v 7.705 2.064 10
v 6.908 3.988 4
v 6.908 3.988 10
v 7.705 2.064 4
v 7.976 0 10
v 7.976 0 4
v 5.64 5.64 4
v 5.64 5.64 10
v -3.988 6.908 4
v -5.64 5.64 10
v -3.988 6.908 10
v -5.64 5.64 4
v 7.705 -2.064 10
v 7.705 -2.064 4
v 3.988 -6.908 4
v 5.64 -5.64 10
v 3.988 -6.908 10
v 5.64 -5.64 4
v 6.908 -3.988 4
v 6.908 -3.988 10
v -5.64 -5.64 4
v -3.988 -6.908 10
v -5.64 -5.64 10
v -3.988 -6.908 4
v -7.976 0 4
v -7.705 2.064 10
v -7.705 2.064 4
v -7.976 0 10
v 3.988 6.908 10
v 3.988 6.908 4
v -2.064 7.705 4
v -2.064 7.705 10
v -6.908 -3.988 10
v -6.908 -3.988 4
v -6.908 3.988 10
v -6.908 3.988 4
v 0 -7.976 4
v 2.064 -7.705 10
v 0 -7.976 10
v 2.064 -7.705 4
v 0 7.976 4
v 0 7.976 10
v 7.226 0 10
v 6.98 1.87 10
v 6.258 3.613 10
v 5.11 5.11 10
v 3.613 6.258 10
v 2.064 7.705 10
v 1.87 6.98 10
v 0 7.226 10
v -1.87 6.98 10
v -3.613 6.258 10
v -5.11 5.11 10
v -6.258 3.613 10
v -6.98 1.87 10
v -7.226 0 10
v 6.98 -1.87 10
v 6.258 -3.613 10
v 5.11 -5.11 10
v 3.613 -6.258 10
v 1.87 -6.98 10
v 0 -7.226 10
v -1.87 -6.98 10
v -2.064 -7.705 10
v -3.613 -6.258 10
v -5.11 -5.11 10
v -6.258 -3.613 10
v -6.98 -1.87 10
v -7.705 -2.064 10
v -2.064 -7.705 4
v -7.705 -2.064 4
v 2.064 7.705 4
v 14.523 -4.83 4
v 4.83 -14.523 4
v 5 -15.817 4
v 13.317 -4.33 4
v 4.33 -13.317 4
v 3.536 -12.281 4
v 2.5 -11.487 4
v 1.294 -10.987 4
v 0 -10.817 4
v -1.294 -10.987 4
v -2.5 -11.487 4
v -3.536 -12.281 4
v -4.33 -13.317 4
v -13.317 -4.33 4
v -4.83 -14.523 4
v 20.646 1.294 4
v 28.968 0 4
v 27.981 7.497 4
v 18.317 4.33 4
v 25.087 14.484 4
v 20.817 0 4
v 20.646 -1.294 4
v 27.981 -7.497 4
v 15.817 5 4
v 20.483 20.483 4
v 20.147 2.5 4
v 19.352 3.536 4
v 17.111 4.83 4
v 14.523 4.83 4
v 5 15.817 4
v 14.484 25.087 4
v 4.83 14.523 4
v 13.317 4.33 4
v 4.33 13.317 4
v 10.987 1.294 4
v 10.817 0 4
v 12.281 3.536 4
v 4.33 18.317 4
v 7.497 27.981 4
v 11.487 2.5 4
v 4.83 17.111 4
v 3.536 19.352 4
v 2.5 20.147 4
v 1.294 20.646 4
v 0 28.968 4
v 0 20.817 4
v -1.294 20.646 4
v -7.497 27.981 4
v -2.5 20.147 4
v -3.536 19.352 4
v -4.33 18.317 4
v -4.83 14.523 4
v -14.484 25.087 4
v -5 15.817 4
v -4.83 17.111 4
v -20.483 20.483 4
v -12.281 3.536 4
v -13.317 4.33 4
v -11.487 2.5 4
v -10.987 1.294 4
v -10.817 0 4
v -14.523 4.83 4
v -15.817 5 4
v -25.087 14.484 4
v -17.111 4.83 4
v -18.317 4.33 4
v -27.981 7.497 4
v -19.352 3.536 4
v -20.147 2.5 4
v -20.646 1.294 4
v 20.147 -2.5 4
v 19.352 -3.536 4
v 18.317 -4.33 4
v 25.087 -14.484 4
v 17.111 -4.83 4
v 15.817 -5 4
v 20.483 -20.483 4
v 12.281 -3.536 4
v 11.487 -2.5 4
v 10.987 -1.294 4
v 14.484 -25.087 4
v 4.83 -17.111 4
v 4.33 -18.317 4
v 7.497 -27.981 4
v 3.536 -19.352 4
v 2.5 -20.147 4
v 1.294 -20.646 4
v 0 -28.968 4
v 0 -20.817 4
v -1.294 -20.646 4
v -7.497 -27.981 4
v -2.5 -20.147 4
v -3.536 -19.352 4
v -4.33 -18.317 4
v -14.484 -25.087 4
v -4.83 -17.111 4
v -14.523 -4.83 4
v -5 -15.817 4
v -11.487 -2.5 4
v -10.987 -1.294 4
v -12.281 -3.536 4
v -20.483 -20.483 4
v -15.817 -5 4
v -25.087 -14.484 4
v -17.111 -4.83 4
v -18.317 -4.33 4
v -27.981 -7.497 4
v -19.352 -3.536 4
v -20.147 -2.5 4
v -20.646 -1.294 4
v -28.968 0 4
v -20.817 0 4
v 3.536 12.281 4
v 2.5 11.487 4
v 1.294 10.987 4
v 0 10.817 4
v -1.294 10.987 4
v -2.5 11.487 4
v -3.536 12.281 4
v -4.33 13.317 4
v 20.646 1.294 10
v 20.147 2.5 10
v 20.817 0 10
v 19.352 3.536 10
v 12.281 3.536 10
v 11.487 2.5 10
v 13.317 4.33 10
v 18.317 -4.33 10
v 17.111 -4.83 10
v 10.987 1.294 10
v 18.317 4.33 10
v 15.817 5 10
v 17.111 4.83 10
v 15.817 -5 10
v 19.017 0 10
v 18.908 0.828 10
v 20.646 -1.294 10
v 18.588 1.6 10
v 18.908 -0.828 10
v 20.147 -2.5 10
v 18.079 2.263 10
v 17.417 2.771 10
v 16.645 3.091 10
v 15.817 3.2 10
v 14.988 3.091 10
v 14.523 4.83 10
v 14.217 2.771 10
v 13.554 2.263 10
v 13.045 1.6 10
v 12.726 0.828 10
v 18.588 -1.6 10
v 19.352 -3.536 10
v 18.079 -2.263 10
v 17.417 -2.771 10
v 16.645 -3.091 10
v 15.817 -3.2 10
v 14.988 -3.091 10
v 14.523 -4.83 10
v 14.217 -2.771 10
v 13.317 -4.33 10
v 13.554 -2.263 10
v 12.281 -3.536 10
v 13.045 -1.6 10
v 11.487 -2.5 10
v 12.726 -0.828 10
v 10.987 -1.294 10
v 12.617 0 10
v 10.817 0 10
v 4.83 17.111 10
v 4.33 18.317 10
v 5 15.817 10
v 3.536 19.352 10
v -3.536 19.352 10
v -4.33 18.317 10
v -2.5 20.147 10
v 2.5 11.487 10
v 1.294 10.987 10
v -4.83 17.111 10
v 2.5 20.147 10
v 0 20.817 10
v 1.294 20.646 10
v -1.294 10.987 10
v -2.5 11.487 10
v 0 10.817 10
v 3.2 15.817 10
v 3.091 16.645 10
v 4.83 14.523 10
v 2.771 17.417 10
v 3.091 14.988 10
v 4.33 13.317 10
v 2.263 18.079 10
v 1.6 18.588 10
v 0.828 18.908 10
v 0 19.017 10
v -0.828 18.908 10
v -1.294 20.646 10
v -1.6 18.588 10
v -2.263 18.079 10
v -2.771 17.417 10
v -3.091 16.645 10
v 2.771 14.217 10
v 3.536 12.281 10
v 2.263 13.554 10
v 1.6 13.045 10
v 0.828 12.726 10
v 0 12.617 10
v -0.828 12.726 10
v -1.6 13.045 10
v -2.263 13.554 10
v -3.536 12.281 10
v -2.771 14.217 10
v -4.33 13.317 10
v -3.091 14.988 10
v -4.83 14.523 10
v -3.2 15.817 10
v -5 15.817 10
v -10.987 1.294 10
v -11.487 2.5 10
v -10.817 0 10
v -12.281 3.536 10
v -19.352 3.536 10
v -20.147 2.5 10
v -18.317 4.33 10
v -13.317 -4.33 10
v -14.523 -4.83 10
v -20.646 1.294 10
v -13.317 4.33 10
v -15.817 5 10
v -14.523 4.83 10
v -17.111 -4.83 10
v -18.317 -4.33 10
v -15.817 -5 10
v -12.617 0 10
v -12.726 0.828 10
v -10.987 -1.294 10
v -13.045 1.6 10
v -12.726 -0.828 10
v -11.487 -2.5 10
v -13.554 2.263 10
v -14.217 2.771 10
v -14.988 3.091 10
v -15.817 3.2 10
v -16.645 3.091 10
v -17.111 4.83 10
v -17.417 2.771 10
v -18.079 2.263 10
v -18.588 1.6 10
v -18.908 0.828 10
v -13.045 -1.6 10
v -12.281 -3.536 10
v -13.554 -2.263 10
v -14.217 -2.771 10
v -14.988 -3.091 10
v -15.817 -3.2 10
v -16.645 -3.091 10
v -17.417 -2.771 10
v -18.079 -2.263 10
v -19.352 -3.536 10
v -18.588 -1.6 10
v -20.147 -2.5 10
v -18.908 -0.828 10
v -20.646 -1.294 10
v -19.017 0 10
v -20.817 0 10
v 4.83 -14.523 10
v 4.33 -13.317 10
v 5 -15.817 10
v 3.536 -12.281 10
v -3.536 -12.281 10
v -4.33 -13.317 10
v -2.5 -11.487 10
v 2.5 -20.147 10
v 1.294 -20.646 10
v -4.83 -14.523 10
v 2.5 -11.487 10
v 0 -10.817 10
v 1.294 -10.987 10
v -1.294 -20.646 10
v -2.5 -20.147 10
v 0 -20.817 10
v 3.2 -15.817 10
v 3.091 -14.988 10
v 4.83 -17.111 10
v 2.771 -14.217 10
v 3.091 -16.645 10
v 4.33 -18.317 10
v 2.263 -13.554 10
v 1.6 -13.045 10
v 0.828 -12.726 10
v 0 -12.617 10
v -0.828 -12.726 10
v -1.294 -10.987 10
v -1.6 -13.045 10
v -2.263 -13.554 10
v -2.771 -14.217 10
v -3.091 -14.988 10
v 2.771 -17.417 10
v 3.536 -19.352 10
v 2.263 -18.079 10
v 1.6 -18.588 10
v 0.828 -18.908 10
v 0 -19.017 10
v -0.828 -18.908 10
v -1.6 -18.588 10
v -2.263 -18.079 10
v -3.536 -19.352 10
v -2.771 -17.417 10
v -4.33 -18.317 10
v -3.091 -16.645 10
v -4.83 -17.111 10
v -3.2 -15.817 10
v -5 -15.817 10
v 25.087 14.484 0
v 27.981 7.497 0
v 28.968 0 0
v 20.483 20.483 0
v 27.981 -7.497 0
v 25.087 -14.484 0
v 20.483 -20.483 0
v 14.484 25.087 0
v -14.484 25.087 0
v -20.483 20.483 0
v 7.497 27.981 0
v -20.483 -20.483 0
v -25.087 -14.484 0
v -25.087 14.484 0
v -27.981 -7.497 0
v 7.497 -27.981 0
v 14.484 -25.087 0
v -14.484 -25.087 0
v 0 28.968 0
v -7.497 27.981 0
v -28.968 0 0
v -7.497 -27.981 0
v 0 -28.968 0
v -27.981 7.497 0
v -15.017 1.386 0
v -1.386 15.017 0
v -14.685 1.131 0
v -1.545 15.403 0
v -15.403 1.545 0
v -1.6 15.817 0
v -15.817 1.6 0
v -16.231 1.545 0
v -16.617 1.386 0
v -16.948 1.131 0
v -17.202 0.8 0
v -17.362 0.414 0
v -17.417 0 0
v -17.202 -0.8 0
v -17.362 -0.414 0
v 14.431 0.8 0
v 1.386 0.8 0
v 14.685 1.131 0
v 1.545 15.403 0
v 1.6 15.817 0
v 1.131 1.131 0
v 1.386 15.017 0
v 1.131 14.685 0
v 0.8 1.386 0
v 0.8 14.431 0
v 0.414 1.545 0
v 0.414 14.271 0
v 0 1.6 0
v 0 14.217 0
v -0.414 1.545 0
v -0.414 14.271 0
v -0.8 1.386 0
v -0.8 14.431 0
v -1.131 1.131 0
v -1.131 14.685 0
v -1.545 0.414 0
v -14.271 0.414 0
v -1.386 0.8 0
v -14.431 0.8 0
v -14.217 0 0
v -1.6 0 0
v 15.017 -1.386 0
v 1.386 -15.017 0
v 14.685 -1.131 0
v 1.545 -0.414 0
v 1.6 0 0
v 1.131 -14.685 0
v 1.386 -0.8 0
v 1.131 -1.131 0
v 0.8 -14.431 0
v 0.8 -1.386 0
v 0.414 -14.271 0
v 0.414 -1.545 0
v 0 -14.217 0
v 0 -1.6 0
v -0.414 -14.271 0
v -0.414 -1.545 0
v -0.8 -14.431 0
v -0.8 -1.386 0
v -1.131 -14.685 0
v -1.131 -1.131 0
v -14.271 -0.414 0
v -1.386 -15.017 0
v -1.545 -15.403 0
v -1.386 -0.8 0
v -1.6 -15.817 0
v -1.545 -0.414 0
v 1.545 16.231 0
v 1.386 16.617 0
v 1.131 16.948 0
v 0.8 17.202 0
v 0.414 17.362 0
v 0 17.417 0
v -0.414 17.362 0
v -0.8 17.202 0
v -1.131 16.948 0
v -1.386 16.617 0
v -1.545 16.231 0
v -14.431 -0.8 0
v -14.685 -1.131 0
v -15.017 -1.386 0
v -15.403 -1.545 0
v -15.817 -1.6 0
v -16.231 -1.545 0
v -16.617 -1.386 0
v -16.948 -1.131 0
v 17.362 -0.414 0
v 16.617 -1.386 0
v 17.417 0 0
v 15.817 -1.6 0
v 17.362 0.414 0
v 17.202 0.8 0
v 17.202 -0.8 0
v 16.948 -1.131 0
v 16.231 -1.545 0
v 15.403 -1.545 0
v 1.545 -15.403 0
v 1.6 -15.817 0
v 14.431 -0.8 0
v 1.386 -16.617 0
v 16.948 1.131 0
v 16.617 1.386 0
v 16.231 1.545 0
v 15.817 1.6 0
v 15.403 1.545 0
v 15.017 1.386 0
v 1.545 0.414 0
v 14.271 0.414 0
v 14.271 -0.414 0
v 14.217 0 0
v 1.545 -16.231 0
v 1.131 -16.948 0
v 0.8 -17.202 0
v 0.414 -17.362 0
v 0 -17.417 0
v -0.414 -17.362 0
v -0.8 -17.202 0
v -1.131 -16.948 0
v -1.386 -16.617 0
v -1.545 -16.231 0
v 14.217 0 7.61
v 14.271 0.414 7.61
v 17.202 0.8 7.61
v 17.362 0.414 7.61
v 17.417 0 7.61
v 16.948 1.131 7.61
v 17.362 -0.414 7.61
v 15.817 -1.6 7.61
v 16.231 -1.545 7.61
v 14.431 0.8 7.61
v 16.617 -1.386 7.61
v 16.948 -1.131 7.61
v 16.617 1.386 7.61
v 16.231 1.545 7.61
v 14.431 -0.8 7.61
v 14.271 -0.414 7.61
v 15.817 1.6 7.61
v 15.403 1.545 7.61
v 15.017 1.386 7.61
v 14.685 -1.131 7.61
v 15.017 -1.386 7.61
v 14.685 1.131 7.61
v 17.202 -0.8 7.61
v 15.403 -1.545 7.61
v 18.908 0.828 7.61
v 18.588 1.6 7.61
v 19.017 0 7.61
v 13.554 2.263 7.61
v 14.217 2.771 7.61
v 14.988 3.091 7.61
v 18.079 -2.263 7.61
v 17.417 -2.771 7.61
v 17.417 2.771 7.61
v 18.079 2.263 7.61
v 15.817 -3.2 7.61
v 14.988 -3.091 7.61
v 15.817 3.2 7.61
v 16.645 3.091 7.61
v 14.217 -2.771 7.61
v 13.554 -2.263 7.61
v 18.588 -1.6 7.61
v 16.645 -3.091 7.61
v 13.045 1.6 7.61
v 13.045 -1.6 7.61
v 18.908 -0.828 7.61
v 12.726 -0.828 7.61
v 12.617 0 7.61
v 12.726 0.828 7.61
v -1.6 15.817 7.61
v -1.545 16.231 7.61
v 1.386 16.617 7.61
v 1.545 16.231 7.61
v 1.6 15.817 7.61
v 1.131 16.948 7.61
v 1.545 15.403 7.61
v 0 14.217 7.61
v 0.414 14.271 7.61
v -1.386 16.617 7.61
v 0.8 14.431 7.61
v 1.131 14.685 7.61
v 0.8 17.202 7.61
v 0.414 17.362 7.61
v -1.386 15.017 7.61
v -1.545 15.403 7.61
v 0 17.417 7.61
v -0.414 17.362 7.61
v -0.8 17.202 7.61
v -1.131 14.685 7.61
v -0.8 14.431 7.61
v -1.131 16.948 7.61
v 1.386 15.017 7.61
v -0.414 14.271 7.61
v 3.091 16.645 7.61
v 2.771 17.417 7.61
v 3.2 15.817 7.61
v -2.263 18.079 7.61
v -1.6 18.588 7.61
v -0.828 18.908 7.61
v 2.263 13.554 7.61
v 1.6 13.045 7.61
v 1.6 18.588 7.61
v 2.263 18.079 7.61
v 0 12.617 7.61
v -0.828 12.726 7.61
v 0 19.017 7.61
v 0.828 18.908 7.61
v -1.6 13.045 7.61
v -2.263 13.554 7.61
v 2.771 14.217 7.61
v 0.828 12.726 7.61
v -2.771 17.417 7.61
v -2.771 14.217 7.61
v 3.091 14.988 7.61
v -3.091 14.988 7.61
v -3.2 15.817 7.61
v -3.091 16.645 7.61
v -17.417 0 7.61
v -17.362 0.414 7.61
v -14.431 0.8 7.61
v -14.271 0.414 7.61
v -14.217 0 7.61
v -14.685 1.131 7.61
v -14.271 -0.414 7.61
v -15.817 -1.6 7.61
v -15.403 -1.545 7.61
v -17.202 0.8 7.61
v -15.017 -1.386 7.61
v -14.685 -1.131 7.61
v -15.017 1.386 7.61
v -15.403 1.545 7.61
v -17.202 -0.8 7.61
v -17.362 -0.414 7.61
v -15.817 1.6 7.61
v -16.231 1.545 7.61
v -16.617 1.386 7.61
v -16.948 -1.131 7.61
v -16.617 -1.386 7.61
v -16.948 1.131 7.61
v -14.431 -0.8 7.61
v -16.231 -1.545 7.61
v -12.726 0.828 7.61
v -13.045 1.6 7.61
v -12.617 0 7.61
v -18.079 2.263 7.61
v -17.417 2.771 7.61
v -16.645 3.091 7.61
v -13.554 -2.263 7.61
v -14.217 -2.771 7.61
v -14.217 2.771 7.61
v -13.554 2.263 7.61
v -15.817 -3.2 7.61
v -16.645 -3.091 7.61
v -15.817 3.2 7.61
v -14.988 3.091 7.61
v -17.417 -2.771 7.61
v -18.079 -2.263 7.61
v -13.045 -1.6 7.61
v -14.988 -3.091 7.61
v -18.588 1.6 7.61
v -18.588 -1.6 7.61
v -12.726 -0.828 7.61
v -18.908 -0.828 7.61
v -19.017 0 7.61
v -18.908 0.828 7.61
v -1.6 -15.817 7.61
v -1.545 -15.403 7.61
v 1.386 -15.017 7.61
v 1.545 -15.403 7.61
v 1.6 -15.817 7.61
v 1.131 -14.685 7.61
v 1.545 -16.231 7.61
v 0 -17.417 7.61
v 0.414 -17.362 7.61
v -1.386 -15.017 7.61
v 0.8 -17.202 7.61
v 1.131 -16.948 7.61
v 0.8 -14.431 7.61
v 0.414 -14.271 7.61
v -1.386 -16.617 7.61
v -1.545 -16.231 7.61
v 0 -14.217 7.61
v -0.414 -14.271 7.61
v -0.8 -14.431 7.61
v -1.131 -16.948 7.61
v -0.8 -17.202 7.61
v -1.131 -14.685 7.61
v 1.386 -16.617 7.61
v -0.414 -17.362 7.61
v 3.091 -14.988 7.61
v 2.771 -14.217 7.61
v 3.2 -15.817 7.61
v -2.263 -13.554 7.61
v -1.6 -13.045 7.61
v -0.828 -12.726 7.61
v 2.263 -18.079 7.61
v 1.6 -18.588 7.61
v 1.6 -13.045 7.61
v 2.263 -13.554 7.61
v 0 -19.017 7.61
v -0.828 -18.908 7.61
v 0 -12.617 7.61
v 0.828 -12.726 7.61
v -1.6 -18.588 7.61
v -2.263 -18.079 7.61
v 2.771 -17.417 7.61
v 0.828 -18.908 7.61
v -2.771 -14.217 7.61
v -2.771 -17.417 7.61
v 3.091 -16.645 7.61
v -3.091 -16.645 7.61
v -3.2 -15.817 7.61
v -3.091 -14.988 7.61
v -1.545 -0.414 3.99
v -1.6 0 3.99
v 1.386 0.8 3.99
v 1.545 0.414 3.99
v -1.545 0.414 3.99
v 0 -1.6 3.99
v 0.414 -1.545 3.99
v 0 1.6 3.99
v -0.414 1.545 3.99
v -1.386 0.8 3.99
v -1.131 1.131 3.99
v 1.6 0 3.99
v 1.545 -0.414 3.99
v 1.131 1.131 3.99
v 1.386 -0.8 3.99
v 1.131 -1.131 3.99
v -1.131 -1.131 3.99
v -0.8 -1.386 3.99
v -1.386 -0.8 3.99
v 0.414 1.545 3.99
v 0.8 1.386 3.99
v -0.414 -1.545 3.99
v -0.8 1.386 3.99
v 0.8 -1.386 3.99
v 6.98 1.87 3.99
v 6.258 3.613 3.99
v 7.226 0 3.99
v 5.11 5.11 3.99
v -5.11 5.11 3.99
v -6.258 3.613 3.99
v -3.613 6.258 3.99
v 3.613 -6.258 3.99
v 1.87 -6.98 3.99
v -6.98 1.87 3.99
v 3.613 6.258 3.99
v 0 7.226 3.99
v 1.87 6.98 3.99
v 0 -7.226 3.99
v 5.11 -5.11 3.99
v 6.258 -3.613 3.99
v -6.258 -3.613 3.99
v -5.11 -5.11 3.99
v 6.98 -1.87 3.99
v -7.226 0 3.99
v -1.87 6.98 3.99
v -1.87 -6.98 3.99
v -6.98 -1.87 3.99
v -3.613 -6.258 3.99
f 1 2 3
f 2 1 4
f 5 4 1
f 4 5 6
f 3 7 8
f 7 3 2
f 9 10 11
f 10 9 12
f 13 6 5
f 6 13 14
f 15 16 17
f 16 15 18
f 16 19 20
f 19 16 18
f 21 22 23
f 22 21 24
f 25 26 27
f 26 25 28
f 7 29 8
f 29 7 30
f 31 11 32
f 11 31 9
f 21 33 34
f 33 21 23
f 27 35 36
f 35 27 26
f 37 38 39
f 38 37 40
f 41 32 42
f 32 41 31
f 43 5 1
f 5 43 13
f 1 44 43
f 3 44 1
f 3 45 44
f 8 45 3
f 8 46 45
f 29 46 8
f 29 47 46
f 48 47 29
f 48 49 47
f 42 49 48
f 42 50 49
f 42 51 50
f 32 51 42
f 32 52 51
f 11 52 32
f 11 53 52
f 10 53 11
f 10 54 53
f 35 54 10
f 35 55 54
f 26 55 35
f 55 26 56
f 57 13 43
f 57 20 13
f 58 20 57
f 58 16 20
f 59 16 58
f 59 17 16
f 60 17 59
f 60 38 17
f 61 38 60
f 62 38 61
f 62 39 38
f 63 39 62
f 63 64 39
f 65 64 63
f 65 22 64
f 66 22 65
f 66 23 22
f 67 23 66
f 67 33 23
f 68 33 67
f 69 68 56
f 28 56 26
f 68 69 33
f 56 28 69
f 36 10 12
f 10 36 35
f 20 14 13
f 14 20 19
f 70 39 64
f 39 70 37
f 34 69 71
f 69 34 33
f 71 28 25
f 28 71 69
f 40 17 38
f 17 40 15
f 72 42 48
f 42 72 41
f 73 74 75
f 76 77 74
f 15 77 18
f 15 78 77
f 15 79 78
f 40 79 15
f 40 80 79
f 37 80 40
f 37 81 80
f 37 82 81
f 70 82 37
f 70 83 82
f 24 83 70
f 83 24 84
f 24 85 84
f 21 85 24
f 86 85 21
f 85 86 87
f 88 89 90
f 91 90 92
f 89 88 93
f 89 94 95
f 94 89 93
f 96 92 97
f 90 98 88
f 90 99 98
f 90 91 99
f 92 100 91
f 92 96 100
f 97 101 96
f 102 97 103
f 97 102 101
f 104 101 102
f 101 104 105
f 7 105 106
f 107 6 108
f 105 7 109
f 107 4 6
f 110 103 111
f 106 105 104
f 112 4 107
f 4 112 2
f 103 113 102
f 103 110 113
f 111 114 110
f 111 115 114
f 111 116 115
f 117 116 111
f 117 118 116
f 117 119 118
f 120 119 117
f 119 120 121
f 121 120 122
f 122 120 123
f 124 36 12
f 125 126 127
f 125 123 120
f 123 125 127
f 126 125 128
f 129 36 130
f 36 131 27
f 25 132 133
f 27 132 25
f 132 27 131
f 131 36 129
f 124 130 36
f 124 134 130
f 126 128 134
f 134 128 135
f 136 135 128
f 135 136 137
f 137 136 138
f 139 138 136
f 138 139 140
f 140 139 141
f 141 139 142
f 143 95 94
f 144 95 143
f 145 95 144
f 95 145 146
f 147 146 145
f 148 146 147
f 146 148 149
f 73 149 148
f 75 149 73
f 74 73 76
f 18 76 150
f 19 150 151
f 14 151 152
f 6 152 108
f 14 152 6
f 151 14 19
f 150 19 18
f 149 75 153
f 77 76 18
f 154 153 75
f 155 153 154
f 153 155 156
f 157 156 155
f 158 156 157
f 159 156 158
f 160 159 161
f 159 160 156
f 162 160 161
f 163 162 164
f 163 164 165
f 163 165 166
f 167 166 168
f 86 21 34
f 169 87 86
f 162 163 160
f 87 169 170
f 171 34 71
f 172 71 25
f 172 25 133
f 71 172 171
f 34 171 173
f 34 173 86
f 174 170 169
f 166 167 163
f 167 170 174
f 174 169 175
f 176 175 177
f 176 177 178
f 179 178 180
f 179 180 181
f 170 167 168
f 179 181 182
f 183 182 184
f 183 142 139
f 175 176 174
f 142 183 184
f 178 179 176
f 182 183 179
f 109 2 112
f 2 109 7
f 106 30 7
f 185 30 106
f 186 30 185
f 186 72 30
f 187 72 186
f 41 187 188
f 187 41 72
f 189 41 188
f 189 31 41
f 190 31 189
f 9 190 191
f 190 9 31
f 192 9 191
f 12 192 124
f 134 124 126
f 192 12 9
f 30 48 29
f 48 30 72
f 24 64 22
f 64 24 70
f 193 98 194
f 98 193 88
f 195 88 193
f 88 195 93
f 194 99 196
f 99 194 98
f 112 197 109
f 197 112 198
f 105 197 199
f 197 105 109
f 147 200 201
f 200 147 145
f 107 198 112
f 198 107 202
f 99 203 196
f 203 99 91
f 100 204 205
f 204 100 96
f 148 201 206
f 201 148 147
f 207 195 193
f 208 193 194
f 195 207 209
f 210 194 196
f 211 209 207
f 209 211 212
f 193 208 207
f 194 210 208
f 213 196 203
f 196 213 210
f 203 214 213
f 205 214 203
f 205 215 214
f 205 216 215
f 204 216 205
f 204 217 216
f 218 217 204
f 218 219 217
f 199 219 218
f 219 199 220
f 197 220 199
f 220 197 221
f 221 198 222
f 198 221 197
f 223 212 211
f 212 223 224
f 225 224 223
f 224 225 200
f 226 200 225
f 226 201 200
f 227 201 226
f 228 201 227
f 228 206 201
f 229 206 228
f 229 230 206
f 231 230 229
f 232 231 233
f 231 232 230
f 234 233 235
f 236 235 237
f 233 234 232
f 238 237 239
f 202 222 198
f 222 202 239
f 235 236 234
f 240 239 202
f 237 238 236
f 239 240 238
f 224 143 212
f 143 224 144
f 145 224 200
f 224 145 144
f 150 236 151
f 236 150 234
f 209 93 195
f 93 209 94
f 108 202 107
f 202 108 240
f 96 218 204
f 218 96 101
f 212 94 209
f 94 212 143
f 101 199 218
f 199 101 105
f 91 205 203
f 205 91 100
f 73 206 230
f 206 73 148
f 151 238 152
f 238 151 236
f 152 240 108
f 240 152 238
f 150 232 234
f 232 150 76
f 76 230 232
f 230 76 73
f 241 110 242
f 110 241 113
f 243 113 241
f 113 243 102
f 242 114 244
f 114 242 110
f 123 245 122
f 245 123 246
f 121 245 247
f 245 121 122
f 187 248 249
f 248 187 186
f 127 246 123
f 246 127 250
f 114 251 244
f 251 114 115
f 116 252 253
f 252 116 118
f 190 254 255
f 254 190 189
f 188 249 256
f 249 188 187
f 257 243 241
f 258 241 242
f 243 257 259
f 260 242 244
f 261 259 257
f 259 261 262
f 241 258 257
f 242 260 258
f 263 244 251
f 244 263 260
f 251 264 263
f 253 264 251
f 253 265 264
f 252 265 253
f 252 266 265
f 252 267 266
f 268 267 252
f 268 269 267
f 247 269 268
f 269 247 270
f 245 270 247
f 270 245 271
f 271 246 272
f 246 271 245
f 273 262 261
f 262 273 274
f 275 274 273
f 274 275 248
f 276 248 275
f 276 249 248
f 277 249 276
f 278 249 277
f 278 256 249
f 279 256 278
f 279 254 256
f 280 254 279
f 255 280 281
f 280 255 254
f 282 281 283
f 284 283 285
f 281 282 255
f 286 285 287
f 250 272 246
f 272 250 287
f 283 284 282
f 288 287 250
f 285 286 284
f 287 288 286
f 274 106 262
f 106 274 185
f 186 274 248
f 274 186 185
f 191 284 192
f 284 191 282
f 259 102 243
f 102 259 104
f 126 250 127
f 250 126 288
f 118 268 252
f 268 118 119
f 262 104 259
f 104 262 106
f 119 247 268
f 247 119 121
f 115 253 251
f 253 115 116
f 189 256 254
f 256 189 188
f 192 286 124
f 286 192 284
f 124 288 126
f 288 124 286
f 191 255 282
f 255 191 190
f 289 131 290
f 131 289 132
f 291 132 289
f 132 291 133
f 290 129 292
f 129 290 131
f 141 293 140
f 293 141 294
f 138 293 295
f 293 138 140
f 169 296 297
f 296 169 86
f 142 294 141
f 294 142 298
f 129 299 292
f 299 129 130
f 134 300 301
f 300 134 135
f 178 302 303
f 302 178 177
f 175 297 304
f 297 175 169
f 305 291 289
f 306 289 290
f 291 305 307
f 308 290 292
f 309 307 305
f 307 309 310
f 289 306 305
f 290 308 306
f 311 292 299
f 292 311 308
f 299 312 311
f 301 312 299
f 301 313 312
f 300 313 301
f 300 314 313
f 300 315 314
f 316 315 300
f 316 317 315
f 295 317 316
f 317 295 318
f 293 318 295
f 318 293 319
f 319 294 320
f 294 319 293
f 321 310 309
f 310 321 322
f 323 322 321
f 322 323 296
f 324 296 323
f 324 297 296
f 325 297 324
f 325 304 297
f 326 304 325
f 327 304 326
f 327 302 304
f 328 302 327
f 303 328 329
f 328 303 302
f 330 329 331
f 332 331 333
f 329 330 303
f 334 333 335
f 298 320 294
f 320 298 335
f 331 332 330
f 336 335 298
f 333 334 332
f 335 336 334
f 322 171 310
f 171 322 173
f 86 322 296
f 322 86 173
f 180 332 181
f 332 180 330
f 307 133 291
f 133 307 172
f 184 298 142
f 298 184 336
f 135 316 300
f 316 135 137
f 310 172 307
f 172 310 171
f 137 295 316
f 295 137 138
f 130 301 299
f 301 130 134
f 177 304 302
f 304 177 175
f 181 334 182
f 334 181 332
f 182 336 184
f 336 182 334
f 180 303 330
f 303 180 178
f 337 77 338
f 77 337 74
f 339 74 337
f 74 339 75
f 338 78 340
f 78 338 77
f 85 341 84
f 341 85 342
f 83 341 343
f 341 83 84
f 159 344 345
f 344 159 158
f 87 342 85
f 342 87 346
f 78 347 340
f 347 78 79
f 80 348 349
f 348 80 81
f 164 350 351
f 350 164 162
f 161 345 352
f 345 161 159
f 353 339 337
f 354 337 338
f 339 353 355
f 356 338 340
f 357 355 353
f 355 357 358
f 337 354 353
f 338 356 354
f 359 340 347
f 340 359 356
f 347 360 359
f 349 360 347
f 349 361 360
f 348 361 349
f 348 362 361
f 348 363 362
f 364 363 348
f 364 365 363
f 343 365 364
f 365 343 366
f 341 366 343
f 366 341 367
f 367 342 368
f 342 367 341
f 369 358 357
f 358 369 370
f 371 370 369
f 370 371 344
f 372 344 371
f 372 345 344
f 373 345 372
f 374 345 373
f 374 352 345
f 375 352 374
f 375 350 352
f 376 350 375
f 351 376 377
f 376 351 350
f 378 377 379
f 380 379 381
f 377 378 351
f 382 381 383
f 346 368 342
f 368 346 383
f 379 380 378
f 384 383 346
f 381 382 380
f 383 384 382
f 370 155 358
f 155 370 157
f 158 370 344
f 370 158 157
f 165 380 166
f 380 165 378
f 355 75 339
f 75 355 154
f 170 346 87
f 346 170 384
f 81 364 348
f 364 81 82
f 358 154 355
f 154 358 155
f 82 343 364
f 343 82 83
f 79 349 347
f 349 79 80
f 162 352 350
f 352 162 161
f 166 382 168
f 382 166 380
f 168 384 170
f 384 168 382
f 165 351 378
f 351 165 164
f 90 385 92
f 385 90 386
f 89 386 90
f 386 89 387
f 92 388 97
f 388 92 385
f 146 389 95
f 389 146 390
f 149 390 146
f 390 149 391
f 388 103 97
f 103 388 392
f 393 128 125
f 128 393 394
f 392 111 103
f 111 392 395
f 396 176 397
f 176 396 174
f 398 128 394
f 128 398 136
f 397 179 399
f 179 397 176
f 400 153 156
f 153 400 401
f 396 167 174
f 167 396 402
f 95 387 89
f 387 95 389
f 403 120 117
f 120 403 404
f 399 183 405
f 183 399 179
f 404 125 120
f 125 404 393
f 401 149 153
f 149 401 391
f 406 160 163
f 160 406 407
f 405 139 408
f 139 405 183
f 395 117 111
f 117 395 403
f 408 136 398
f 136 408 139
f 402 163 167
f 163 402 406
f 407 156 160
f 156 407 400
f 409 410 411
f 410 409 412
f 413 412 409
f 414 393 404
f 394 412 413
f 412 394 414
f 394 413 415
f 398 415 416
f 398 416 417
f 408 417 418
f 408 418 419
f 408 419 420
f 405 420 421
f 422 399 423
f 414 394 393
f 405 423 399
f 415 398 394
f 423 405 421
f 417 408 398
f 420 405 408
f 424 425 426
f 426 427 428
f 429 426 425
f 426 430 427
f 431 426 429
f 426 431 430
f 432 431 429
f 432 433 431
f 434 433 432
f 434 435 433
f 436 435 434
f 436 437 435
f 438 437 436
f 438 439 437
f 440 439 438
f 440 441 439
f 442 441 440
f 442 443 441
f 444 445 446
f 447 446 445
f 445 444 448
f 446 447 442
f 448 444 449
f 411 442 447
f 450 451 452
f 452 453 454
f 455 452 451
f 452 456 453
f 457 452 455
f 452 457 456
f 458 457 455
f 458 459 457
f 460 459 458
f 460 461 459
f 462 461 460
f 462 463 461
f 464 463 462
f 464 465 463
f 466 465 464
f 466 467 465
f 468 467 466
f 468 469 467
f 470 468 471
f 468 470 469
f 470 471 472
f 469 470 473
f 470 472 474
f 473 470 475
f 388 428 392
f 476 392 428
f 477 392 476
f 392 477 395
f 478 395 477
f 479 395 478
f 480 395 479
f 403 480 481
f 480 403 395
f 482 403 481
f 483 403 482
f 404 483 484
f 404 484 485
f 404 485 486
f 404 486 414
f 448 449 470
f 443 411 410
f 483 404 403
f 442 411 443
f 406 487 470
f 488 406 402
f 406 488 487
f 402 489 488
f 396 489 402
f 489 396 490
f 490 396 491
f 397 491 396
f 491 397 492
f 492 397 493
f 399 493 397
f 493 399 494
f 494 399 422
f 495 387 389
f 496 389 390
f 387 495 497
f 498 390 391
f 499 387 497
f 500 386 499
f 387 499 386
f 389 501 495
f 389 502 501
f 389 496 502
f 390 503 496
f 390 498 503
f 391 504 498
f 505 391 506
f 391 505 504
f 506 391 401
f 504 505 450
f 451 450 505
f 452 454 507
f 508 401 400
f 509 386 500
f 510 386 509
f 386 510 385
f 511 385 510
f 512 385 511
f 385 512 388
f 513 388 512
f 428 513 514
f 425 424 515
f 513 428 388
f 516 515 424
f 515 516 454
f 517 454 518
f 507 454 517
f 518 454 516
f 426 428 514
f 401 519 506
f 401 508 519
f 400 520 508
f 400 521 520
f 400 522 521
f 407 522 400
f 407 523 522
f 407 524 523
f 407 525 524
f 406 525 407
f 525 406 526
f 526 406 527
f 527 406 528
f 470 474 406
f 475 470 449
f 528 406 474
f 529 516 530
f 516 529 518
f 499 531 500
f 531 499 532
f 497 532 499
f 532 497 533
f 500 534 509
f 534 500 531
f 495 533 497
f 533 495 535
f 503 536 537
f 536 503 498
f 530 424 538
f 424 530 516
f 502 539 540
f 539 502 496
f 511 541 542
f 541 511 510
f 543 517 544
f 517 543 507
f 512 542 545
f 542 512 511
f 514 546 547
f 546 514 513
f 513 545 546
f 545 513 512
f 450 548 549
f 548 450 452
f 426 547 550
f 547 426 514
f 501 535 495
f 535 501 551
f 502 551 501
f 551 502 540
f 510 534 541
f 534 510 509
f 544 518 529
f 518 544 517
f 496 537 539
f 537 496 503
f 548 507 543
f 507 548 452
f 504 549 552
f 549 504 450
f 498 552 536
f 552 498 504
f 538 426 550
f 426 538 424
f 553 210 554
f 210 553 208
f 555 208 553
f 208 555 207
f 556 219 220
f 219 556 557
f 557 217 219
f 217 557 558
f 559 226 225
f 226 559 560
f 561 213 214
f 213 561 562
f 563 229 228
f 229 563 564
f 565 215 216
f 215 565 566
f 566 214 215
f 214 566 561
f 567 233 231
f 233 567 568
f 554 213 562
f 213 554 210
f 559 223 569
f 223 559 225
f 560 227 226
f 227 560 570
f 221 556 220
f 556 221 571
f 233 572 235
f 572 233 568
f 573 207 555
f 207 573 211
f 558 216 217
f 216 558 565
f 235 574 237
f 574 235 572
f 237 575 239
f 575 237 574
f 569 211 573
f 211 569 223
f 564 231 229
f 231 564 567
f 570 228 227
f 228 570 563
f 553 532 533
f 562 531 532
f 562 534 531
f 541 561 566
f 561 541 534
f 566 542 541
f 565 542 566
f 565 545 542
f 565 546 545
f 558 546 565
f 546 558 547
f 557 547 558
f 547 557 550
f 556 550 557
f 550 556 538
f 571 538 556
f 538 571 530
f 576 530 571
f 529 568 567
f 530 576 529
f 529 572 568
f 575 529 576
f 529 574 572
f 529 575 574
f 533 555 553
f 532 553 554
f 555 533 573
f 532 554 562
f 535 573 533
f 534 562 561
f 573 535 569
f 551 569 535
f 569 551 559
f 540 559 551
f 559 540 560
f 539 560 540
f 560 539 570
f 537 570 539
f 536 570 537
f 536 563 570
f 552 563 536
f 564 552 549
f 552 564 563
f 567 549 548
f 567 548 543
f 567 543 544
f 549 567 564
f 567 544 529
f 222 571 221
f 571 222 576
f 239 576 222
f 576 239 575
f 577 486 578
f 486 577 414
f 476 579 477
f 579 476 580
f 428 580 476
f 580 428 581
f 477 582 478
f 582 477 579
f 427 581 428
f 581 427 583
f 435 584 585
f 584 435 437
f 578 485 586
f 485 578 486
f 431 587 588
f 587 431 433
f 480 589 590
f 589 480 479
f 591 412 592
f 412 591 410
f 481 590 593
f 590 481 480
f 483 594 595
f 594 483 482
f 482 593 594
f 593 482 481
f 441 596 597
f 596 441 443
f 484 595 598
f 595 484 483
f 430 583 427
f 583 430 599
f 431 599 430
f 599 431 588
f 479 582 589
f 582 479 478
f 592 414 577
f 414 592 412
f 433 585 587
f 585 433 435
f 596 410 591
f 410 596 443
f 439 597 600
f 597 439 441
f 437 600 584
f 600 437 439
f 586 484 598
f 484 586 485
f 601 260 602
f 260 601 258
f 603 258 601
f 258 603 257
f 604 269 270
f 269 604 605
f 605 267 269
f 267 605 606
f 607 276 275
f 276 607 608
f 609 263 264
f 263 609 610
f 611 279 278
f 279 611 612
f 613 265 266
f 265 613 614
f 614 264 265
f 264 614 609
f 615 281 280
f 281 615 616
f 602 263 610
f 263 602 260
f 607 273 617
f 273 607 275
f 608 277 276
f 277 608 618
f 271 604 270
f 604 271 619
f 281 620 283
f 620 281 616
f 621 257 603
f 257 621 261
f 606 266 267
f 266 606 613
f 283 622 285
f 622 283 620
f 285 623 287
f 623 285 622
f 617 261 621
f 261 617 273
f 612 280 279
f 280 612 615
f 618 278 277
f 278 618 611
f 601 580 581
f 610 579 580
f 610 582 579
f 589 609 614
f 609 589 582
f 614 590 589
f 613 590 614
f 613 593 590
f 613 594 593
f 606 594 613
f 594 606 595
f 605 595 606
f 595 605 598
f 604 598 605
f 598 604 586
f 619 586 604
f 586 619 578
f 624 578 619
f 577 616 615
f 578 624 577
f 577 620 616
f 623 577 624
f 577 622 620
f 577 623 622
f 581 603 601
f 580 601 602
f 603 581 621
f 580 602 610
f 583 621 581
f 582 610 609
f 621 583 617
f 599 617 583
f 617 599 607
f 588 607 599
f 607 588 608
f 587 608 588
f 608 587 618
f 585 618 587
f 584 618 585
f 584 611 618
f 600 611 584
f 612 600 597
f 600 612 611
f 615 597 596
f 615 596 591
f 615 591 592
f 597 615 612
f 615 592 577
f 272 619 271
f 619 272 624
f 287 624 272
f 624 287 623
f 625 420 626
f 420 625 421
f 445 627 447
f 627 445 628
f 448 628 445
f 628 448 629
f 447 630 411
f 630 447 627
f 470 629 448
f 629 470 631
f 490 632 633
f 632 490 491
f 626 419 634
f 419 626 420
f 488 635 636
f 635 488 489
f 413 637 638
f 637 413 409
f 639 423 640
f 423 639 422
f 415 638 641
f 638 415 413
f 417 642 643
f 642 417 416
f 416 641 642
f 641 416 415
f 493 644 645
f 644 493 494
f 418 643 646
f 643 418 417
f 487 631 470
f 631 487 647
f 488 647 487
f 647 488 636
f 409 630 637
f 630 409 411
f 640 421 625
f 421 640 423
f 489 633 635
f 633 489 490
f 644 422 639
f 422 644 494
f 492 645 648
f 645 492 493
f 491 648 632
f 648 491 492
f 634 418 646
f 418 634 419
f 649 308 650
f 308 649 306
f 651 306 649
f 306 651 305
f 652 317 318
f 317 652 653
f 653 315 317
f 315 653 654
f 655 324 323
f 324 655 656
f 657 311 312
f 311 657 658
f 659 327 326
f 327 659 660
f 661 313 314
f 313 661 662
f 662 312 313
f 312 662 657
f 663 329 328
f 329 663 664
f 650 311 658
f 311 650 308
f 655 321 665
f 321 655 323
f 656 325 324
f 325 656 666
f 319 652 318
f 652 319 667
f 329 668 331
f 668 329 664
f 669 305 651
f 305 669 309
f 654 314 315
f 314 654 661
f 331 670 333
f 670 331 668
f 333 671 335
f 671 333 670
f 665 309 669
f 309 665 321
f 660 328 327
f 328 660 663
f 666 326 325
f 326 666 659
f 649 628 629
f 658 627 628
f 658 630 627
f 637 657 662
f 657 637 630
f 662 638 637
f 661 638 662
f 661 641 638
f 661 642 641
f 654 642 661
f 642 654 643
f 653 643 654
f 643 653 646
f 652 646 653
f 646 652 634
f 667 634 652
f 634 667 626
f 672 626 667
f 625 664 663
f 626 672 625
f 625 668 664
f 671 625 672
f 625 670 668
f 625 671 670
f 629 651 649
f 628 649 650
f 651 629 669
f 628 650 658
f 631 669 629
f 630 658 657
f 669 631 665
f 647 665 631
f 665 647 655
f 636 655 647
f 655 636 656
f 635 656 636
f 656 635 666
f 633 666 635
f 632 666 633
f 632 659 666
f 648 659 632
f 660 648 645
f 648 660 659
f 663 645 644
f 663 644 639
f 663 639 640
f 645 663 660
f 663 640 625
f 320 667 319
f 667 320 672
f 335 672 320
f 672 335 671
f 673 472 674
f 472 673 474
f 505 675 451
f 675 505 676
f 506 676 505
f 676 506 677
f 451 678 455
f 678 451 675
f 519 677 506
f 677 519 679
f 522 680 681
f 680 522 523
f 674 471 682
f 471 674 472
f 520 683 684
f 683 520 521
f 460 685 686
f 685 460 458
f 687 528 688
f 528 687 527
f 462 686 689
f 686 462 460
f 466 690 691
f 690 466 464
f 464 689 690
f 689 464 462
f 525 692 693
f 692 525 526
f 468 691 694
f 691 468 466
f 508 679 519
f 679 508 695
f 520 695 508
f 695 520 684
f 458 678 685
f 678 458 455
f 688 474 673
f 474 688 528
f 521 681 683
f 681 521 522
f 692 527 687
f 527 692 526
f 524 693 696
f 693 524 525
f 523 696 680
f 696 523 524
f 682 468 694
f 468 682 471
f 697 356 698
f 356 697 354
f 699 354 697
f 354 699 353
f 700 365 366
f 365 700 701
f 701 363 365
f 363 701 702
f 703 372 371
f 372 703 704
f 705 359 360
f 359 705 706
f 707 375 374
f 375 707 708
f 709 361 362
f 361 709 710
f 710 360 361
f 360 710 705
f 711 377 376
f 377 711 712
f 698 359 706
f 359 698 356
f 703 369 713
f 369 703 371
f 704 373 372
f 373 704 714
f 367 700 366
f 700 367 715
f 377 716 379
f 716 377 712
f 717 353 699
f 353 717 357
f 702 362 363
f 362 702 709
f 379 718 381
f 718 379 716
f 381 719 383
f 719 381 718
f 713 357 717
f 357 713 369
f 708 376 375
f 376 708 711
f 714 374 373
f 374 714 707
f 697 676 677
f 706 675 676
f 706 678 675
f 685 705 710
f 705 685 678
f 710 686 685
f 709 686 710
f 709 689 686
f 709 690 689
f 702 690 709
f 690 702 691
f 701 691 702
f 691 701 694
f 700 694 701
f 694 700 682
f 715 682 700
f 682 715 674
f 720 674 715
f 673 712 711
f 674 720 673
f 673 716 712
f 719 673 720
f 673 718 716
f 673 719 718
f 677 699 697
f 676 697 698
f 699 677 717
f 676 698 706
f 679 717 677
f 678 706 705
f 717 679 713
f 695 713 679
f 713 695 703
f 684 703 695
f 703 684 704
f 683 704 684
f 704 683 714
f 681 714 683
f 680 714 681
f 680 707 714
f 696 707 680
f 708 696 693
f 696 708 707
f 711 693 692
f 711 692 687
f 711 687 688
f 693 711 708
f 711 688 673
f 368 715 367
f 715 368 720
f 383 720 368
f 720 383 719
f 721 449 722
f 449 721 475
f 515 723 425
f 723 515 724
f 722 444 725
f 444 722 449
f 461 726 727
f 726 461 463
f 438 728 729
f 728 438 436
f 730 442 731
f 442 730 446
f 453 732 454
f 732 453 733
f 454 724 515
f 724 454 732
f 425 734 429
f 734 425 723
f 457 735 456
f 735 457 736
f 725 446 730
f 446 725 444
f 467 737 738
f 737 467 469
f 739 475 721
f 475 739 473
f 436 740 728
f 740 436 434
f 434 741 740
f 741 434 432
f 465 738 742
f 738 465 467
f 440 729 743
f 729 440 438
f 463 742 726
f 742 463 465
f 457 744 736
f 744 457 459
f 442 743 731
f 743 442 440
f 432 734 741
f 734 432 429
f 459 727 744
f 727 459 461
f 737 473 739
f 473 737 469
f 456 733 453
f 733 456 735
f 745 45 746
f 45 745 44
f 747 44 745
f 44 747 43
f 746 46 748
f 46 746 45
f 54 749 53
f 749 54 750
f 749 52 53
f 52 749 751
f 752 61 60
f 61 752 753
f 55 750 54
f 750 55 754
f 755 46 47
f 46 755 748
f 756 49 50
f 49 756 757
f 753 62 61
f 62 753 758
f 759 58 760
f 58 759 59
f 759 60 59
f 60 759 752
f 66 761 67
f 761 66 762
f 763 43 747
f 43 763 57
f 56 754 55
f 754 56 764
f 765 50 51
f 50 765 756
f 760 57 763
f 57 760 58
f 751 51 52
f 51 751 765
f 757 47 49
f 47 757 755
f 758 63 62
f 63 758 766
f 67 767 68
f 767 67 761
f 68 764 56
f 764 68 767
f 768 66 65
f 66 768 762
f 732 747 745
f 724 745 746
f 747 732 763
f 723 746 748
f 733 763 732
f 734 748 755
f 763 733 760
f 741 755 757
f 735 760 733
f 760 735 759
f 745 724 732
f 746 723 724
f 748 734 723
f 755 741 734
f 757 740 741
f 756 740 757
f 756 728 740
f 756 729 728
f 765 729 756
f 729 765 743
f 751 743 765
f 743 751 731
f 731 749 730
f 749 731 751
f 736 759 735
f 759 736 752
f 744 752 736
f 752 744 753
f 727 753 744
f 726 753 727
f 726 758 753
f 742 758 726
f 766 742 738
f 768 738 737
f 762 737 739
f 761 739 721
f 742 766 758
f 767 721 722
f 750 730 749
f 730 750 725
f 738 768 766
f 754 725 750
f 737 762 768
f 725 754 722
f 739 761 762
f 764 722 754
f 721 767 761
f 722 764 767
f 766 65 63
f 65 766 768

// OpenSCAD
//====================================================
// Печатная оснастка для геликальной антенны (спираль не выводится)
// DEV версия v17
//====================================================
// Задача: печатные детали для сборки axial-mode геликальной антенны:
// - Труба для намотки (опционально канавка-ориентир; спираль не печатается)
// - Шаблон для сверления/резки рефлектора (опционально)
// - Крепёж из 2 деталей: (A) площадка под трубу с кольцом и стойками, (B) крепление к плоскости с 4 ушами
// - Посадка под SMA на квадратной площадке со стороны рефлектора
// - Опциональный кондуктор для гибки дельта-матча (сам дельта-матч — проволока)
//
// Единицы: миллиметры
//====================================================

/* [Быстрый экспорт] */
// Выбор детали для вывода/экспорта (STL).
// Примечание: технические идентификаторы (assembly/tube/...) не переводим, чтобы код оставался простым.
export_part_sel = 3; // [0:Сборка (все вместе),1:Труба целиком,2:Труба - секция,3:Площадка под трубу,4:Крепление к плоскости,5:Шаблон рефлектора,6:Кондуктор дельта-матча]
export_part_list = ["assembly","tube","tube_section","plate","wall_mount","reflector_template","delta_jig"]; 
export_part = export_part_list[export_part_sel];

/* [РЧ параметры] */
freq_mhz = 5800;          // Рабочая частота (МГц)
target_gain_dbi = 12;     // Только для расчёта длины трубы (спираль не выводится)
polarization = "RHCP";    // [RHCP,LHCP] (ориентир: RHCP/LHCP)

/* [Геометрия спирали (только для расчёта трубы)] */
circumference_factor = 1.00;  // C ≈ 1.0*λ (старт для axial-mode)
pitch_factor = 0.25;          // S ≈ 0.25*λ (старт для axial-mode)
min_turns = 5.5;
max_turns = 14;

/* [Проволока и согласование (дельта-матч)] */
wire_d = 1.2;                 // Диаметр проволоки (мм)
wire_material = "CuAlloy";    // [CuAlloy,Brass,Al] (потери разные; геометрия важнее для согласования)
delta_mode = "auto";          // [auto,manual] auto=авторасчёт, manual=вручную
delta_base_manual = 0;        // мм (0 = игнорировать)
delta_height_manual = 0;      // мм (0 = игнорировать)
delta_tap_manual = 0;         // мм от "заземлённого" конца по стороне треугольника (0 = игнорировать)

/* [Труба намотки] */
tube_wall = 2.0;              // mm
tube_clearance = 0.25;        // мм (посадка на кольцо)
tube_groove_enable = true;    // делать направляющую канавку (для ровной укладки проволоки)

groove_segments_per_turn = 24; // Кол-во сегментов канавки на один виток (выше = ровнее, но медленнее)

tube_groove_depth = 0.5;      // мм (глубина канавки в трубе)
tube_groove_width = 1.2;      // mm
tube_sections = 3;            // кол-во секций трубы для печати
tube_section_gap = 0.25;      // мм зазор между секциями (допуск сборки)
export_section = 0;           // какую секцию экспортировать (актуально, если выбрана "Труба - секция")

/* [Площадка под трубу (деталь A)] */
plate_thickness = 4.0;        // mm
plate_od_extra = 14;          // мм запас за край рефлектора для прочности
spigot_height = 6.0;          // mm
standoff_count = 4;
standoff_d = 10.0;            // мм (наружный диаметр)
standoff_h = 6.0;             // мм (высота над площадкой)
clamp_screw_d = 3.2;          // мм проход под M3 (поменяй под свой крепёж)
clamp_screw_head_d = 6.4;     // опциональная выборка под шляпку
clamp_screw_head_h = 2.4;

/* [Крепление к плоскости (деталь B)] */
wall_block_thickness = 5.0;   // мм (по твоему ТЗ)
wall_block_xy = 28;           // мм габарит опорного блока (примерно квадрат)
lug_length = 10;              // mm
lug_width = 10;               // mm
lug_hole_d = 5.0;             // мм (по твоему ТЗ)
lug_pair_gap = 10;            // мм расстояние между двумя ушами на одной стороне

/* [Шаблон рефлектора] */
reflector_mode = "auto";      // [auto,manual] auto=авто, manual=вручную
reflector_d_manual = 120;     // мм если manual
reflector_thickness_template = 1.0;  // мм (только шаблон; реальный рефлектор обычно из металла)

/* [Разъём SMA на площадке] */
// Твой SMA: квадрат ~12.6 мм, отверстия по углам ~8 мм (центр-центр) ~8mm (center-to-center)
sma_flange_side = 12.6;       // мм (сторона квадратной площадки)
sma_hole_spacing = 8.0;       // mm (center-to-center)
sma_flange_hole_d = 2.4;      // мм (под винтики разъёма)
sma_center_hole_d = 6.6;      // мм (отверстие под тело разъёма)
sma_offset_r = 0;             // мм смещение от центра (0 = по центру)

/* [Качество рендера] */
preview_mode = true;         // Быстрый режим для превью (резко ускоряет первый рендер)
render_preset = "normal";    // [fast,normal,pretty] fast=быстро, normal=нормально, pretty=красиво

// Внутренняя настройка качества (не трогай, если не нужно)
$fn = (preview_mode || render_preset=="fast") ? 24 :
      (render_preset=="pretty" ? 96 : 48);


//====================================================
// Derived values
//====================================================
function clamp(x, a, b) = x < a ? a : (x > b ? b : x);

// Speed of light (mm/s)
c_mm_s = 299792458000;
freq_hz = freq_mhz * 1e6;
lambda_mm = c_mm_s / freq_hz;

// Axial-mode starting values (tube sizing only)
circ_mm = lambda_mm * circumference_factor;
tube_od = circ_mm / PI;
pitch_mm = lambda_mm * pitch_factor;

// Tube length sizing by gain rule-of-thumb
turns_raw = pow(10, (target_gain_dbi - 5.4)/10);
turns = clamp(turns_raw, min_turns, max_turns);
tube_len = turns * pitch_mm;

// Reflector diameter (auto start)
reflector_d_auto = lambda_mm * 0.85;
reflector_d = (reflector_mode == "manual") ? reflector_d_manual : reflector_d_auto;

// Plate OD: slightly larger than reflector
plate_od = reflector_d + plate_od_extra;

// Spigot geometry: tube slips OVER spigot
tube_id = tube_od - 2*tube_wall;
spigot_od = tube_id - 2*tube_clearance;
spigot_id = max(0.1, spigot_od - 2.4);

// Standoff circle radius
standoff_r = (reflector_d/2) * 0.72;

//====================================================
// Delta-match "auto" starting geometry
//====================================================
// Starting point (empirical): base ~0.18λ, height ~0.10λ, tap ~45% of height.
// Material mostly affects loss (Q); geometry dominates match.
// Expect tuning in the real build.
mat_k = (wire_material == "Brass") ? 0.995 : (wire_material == "Al") ? 0.990 : 1.000;
wd_k = 1.0 - clamp((wire_d - 1.0) * 0.002, -0.02, 0.02);

delta_base_auto = lambda_mm * 0.18 * mat_k * wd_k;
delta_height_auto = lambda_mm * 0.10 * mat_k * wd_k;
delta_tap_auto = delta_height_auto * 0.45;

delta_base = (delta_mode == "manual" && delta_base_manual > 0) ? delta_base_manual : delta_base_auto;
delta_height = (delta_mode == "manual" && delta_height_manual > 0) ? delta_height_manual : delta_height_auto;
delta_tap = (delta_mode == "manual" && delta_tap_manual > 0) ? delta_tap_manual : delta_tap_auto;

// Print computed values in OpenSCAD console
echo("==== Helical Antenna v17 (mechanical parts only) ====");
echo("freq_mhz=", freq_mhz, " lambda_mm=", lambda_mm);
echo("tube_od(mm)=", tube_od, " tube_len(mm)=", tube_len, " pitch(mm)=", pitch_mm, " turns=", turns);
echo("reflector_d(mm)=", reflector_d);
echo("Delta-match (start) base(mm)=", delta_base, " height(mm)=", delta_height, " tap(mm)=", delta_tap);
echo("Polarization=", polarization);

//====================================================
// Modules
//====================================================

module drill_hole(d, h, cbore_d=0, cbore_h=0) {
    cylinder(d=d, h=h, center=false);
    if (cbore_d > 0 && cbore_h > 0)
        translate([0,0,h-cbore_h]) cylinder(d=cbore_d, h=cbore_h, center=false);
}


// Быстрый "стержень" между двумя точками (для канавки). Нам достаточно цилиндра.
module rod_between(p0, p1, d) {
    v = [p1[0]-p0[0], p1[1]-p0[1], p1[2]-p0[2]];
    h = norm(v);
    if (h > 0) {
        // Ось Z -> вектор v (быстро, без hull/sphere)
        ax = cross([0,0,1], v);
        axn = norm(ax);
        ang = acos(v[2] / h);

        translate(p0) {
            if (axn < 1e-9) {
                cylinder(d=d, h=h, center=false);
            } else {
                rotate(a=ang, v=ax) cylinder(d=d, h=h, center=false);
            }
        }
    }
}

module sma_flange_holes(th) {
    for (sx=[-1,1], sy=[-1,1]) {
        translate([sx*sma_hole_spacing/2, sy*sma_hole_spacing/2, 0])
            cylinder(d=sma_flange_hole_d, h=th, center=false);
    }
}

module sma_center_hole(th) {
    cylinder(d=sma_center_hole_d, h=th, center=false);
}

module plate_part() {
    // Part A: plate + spigot + standoffs
    difference() {
        union() {
            cylinder(d=plate_od, h=plate_thickness);

            translate([0,0,plate_thickness])
                difference() {
                    cylinder(d=spigot_od + 4.0, h=spigot_height);
                    translate([0,0,-0.01]) cylinder(d=spigot_od, h=spigot_height+0.02);
                }

            for (i=[0:standoff_count-1]) {
                ang = 360*i/standoff_count;
                translate([standoff_r*cos(ang), standoff_r*sin(ang), plate_thickness])
                    cylinder(d=standoff_d, h=standoff_h);
            }
        }

        // Central clamp screw
        translate([0,0,-0.01])
            cylinder(d=clamp_screw_d, h=plate_thickness+spigot_height+standoff_h+0.02);

        // Clamp holes in standoffs
        for (i=[0:standoff_count-1]) {
            ang = 360*i/standoff_count;
            translate([standoff_r*cos(ang), standoff_r*sin(ang), -0.01])
                drill_hole(clamp_screw_d, plate_thickness+standoff_h+0.02, clamp_screw_head_d, clamp_screw_head_h);
        }

        // Tube inner clearance
        translate([0,0,plate_thickness-0.01])
            cylinder(d=tube_id + 2.0, h=spigot_height+standoff_h+0.02);
    }
}

module wall_mount_part() {
    // Part B: wall/plane mount block with 4 lugs (Ø5 holes) + clamp holes aligned to standoffs
    difference() {
        union() {
            translate([-wall_block_xy/2, -wall_block_xy/2, 0])
                cube([wall_block_xy, wall_block_xy, wall_block_thickness]);

            // Two lugs on +Y side
            for (k=[-1,1]) {
                translate([k*(lug_pair_gap/2), wall_block_xy/2, 0])
                    translate([-lug_width/2, 0, 0])
                        cube([lug_width, lug_length, wall_block_thickness]);
            }
            // Two lugs on -Y side
            for (k=[-1,1]) {
                translate([k*(lug_pair_gap/2), -wall_block_xy/2 - lug_length, 0])
                    translate([-lug_width/2, 0, 0])
                        cube([lug_width, lug_length, wall_block_thickness]);
            }
        }

        // Four Ø5 through-holes in lugs
        for (side=[1,-1]) for (k=[-1,1]) {
            y0 = (side==1) ? (wall_block_xy/2 + lug_length/2) : (-wall_block_xy/2 - lug_length/2);
            translate([k*(lug_pair_gap/2), y0, -0.01])
                cylinder(d=lug_hole_d, h=wall_block_thickness+0.02);
        }

        // Clamp-screw clearance holes aligned with plate standoffs
        for (i=[0:standoff_count-1]) {
            ang = 360*i/standoff_count;
            translate([standoff_r*cos(ang), standoff_r*sin(ang), -0.01])
                cylinder(d=clamp_screw_d, h=wall_block_thickness+0.02);
        }

        // Central clamp screw
        translate([0,0,-0.01])
            cylinder(d=clamp_screw_d, h=wall_block_thickness+0.02);
    }
}

module reflector_template() {
    // Optional: printable drilling/cutting template for your metal reflector.
    difference() {
        cylinder(d=reflector_d, h=reflector_thickness_template);

        // Clamp holes
        for (i=[0:standoff_count-1]) {
            ang = 360*i/standoff_count;
            translate([standoff_r*cos(ang), standoff_r*sin(ang), -0.01])
                cylinder(d=clamp_screw_d, h=reflector_thickness_template+0.02);
        }

        // Central clamp hole
        translate([0,0,-0.01]) cylinder(d=clamp_screw_d, h=reflector_thickness_template+0.02);

        // SMA footprint
        translate([sma_offset_r,0,-0.01]) {
            sma_center_hole(reflector_thickness_template+0.02);
            sma_flange_holes(reflector_thickness_template+0.02);
        }
    }
}

module tube_single() {
    // Труба с опциональной неглубокой канавкой-ориентиром (спираль не печатается)
    difference() {
        // Outer tube
        cylinder(d=tube_od, h=tube_len);

        // Inner bore
        translate([0,0,-0.01]) cylinder(d=tube_id, h=tube_len+0.02);

        // Shallow guide groove cutter (biting only tube_groove_depth)
        if (tube_groove_enable) {
            // В превью резко снижаем детализацию, иначе OpenSCAD будет "умирать"
            seg_per_turn = (preview_mode || render_preset=="fast") ? max(8, floor(groove_segments_per_turn/3)) : groove_segments_per_turn;
            steps = max( max(24, ceil(turns*seg_per_turn)), ceil(tube_len/2) );
            r_cut = tube_od/2 - tube_groove_depth/2;

            for (i=[0:steps-1]) {
                t0 = i/steps;
                t1 = (i+1)/steps;
                z0 = t0*tube_len;
                z1 = t1*tube_len;
                a0 = 360*turns*t0 * ((polarization=="RHCP") ? 1 : -1);
                a1 = 360*turns*t1 * ((polarization=="RHCP") ? 1 : -1);

                p0 = [r_cut*cos(a0), r_cut*sin(a0), z0];
                p1 = [r_cut*cos(a1), r_cut*sin(a1), z1];
                rod_between(p0, p1, tube_groove_width);
            }
        }
    }
}

module tube_section(idx=0) {
    seg_len = (tube_len - (tube_sections-1)*tube_section_gap) / tube_sections;
    z0 = idx*(seg_len + tube_section_gap);

    // Move section to origin for export convenience
    translate([0,0,-z0])
        intersection() {
            tube_single();
            translate([-tube_od, -tube_od, z0])
                cube([2*tube_od, 2*tube_od, seg_len]);
        }
}

module delta_match_jig() {
    // A flat jig to bend the delta-match wire to the computed triangle.
    base_th = 4;
    peg_h = 8;
    peg_d = max(wire_d*2.2, 3.5);

    pA = [0, 0];                 // grounded end
    pB = [delta_base, 0];        // helix end (on first turn)
    pC = [0, delta_height];      // apex
    pT = [0, delta_tap];         // tap point on A->C

    pad = 10;
    w = delta_base + pad*2;
    h = delta_height + pad*2;

    translate([-pad, -pad, 0]) cube([w, h, base_th]);

    for (p=[pA,pB,pC,pT]) {
        translate([p[0], p[1], base_th])
            cylinder(d=peg_d, h=peg_h);
    }
}

module assembly() {
    // Stack view (bottom -> top): wall_mount -> reflector template (hover) -> plate -> tube
    wall_mount_part();

    // template hovering for reference
    translate([0,0,wall_block_thickness + 0.2])
        reflector_template();

    translate([0,0,wall_block_thickness + 0.2 + reflector_thickness_template + 0.2])
        plate_part();

    translate([0,0,wall_block_thickness + 0.2 + reflector_thickness_template + 0.2 + plate_thickness])
        tube_single();
}

//====================================================
// Main switch
//====================================================
if (export_part == "assembly") {
    assembly();
} else if (export_part == "tube") {
    tube_single();
} else if (export_part == "tube_section") {
    tube_section(export_section);
} else if (export_part == "plate") {
    plate_part();
} else if (export_part == "wall_mount") {
    wall_mount_part();
} else if (export_part == "reflector_template") {
    reflector_template();
} else if (export_part == "delta_jig") {
    delta_match_jig();
} else {
    assembly();
}
